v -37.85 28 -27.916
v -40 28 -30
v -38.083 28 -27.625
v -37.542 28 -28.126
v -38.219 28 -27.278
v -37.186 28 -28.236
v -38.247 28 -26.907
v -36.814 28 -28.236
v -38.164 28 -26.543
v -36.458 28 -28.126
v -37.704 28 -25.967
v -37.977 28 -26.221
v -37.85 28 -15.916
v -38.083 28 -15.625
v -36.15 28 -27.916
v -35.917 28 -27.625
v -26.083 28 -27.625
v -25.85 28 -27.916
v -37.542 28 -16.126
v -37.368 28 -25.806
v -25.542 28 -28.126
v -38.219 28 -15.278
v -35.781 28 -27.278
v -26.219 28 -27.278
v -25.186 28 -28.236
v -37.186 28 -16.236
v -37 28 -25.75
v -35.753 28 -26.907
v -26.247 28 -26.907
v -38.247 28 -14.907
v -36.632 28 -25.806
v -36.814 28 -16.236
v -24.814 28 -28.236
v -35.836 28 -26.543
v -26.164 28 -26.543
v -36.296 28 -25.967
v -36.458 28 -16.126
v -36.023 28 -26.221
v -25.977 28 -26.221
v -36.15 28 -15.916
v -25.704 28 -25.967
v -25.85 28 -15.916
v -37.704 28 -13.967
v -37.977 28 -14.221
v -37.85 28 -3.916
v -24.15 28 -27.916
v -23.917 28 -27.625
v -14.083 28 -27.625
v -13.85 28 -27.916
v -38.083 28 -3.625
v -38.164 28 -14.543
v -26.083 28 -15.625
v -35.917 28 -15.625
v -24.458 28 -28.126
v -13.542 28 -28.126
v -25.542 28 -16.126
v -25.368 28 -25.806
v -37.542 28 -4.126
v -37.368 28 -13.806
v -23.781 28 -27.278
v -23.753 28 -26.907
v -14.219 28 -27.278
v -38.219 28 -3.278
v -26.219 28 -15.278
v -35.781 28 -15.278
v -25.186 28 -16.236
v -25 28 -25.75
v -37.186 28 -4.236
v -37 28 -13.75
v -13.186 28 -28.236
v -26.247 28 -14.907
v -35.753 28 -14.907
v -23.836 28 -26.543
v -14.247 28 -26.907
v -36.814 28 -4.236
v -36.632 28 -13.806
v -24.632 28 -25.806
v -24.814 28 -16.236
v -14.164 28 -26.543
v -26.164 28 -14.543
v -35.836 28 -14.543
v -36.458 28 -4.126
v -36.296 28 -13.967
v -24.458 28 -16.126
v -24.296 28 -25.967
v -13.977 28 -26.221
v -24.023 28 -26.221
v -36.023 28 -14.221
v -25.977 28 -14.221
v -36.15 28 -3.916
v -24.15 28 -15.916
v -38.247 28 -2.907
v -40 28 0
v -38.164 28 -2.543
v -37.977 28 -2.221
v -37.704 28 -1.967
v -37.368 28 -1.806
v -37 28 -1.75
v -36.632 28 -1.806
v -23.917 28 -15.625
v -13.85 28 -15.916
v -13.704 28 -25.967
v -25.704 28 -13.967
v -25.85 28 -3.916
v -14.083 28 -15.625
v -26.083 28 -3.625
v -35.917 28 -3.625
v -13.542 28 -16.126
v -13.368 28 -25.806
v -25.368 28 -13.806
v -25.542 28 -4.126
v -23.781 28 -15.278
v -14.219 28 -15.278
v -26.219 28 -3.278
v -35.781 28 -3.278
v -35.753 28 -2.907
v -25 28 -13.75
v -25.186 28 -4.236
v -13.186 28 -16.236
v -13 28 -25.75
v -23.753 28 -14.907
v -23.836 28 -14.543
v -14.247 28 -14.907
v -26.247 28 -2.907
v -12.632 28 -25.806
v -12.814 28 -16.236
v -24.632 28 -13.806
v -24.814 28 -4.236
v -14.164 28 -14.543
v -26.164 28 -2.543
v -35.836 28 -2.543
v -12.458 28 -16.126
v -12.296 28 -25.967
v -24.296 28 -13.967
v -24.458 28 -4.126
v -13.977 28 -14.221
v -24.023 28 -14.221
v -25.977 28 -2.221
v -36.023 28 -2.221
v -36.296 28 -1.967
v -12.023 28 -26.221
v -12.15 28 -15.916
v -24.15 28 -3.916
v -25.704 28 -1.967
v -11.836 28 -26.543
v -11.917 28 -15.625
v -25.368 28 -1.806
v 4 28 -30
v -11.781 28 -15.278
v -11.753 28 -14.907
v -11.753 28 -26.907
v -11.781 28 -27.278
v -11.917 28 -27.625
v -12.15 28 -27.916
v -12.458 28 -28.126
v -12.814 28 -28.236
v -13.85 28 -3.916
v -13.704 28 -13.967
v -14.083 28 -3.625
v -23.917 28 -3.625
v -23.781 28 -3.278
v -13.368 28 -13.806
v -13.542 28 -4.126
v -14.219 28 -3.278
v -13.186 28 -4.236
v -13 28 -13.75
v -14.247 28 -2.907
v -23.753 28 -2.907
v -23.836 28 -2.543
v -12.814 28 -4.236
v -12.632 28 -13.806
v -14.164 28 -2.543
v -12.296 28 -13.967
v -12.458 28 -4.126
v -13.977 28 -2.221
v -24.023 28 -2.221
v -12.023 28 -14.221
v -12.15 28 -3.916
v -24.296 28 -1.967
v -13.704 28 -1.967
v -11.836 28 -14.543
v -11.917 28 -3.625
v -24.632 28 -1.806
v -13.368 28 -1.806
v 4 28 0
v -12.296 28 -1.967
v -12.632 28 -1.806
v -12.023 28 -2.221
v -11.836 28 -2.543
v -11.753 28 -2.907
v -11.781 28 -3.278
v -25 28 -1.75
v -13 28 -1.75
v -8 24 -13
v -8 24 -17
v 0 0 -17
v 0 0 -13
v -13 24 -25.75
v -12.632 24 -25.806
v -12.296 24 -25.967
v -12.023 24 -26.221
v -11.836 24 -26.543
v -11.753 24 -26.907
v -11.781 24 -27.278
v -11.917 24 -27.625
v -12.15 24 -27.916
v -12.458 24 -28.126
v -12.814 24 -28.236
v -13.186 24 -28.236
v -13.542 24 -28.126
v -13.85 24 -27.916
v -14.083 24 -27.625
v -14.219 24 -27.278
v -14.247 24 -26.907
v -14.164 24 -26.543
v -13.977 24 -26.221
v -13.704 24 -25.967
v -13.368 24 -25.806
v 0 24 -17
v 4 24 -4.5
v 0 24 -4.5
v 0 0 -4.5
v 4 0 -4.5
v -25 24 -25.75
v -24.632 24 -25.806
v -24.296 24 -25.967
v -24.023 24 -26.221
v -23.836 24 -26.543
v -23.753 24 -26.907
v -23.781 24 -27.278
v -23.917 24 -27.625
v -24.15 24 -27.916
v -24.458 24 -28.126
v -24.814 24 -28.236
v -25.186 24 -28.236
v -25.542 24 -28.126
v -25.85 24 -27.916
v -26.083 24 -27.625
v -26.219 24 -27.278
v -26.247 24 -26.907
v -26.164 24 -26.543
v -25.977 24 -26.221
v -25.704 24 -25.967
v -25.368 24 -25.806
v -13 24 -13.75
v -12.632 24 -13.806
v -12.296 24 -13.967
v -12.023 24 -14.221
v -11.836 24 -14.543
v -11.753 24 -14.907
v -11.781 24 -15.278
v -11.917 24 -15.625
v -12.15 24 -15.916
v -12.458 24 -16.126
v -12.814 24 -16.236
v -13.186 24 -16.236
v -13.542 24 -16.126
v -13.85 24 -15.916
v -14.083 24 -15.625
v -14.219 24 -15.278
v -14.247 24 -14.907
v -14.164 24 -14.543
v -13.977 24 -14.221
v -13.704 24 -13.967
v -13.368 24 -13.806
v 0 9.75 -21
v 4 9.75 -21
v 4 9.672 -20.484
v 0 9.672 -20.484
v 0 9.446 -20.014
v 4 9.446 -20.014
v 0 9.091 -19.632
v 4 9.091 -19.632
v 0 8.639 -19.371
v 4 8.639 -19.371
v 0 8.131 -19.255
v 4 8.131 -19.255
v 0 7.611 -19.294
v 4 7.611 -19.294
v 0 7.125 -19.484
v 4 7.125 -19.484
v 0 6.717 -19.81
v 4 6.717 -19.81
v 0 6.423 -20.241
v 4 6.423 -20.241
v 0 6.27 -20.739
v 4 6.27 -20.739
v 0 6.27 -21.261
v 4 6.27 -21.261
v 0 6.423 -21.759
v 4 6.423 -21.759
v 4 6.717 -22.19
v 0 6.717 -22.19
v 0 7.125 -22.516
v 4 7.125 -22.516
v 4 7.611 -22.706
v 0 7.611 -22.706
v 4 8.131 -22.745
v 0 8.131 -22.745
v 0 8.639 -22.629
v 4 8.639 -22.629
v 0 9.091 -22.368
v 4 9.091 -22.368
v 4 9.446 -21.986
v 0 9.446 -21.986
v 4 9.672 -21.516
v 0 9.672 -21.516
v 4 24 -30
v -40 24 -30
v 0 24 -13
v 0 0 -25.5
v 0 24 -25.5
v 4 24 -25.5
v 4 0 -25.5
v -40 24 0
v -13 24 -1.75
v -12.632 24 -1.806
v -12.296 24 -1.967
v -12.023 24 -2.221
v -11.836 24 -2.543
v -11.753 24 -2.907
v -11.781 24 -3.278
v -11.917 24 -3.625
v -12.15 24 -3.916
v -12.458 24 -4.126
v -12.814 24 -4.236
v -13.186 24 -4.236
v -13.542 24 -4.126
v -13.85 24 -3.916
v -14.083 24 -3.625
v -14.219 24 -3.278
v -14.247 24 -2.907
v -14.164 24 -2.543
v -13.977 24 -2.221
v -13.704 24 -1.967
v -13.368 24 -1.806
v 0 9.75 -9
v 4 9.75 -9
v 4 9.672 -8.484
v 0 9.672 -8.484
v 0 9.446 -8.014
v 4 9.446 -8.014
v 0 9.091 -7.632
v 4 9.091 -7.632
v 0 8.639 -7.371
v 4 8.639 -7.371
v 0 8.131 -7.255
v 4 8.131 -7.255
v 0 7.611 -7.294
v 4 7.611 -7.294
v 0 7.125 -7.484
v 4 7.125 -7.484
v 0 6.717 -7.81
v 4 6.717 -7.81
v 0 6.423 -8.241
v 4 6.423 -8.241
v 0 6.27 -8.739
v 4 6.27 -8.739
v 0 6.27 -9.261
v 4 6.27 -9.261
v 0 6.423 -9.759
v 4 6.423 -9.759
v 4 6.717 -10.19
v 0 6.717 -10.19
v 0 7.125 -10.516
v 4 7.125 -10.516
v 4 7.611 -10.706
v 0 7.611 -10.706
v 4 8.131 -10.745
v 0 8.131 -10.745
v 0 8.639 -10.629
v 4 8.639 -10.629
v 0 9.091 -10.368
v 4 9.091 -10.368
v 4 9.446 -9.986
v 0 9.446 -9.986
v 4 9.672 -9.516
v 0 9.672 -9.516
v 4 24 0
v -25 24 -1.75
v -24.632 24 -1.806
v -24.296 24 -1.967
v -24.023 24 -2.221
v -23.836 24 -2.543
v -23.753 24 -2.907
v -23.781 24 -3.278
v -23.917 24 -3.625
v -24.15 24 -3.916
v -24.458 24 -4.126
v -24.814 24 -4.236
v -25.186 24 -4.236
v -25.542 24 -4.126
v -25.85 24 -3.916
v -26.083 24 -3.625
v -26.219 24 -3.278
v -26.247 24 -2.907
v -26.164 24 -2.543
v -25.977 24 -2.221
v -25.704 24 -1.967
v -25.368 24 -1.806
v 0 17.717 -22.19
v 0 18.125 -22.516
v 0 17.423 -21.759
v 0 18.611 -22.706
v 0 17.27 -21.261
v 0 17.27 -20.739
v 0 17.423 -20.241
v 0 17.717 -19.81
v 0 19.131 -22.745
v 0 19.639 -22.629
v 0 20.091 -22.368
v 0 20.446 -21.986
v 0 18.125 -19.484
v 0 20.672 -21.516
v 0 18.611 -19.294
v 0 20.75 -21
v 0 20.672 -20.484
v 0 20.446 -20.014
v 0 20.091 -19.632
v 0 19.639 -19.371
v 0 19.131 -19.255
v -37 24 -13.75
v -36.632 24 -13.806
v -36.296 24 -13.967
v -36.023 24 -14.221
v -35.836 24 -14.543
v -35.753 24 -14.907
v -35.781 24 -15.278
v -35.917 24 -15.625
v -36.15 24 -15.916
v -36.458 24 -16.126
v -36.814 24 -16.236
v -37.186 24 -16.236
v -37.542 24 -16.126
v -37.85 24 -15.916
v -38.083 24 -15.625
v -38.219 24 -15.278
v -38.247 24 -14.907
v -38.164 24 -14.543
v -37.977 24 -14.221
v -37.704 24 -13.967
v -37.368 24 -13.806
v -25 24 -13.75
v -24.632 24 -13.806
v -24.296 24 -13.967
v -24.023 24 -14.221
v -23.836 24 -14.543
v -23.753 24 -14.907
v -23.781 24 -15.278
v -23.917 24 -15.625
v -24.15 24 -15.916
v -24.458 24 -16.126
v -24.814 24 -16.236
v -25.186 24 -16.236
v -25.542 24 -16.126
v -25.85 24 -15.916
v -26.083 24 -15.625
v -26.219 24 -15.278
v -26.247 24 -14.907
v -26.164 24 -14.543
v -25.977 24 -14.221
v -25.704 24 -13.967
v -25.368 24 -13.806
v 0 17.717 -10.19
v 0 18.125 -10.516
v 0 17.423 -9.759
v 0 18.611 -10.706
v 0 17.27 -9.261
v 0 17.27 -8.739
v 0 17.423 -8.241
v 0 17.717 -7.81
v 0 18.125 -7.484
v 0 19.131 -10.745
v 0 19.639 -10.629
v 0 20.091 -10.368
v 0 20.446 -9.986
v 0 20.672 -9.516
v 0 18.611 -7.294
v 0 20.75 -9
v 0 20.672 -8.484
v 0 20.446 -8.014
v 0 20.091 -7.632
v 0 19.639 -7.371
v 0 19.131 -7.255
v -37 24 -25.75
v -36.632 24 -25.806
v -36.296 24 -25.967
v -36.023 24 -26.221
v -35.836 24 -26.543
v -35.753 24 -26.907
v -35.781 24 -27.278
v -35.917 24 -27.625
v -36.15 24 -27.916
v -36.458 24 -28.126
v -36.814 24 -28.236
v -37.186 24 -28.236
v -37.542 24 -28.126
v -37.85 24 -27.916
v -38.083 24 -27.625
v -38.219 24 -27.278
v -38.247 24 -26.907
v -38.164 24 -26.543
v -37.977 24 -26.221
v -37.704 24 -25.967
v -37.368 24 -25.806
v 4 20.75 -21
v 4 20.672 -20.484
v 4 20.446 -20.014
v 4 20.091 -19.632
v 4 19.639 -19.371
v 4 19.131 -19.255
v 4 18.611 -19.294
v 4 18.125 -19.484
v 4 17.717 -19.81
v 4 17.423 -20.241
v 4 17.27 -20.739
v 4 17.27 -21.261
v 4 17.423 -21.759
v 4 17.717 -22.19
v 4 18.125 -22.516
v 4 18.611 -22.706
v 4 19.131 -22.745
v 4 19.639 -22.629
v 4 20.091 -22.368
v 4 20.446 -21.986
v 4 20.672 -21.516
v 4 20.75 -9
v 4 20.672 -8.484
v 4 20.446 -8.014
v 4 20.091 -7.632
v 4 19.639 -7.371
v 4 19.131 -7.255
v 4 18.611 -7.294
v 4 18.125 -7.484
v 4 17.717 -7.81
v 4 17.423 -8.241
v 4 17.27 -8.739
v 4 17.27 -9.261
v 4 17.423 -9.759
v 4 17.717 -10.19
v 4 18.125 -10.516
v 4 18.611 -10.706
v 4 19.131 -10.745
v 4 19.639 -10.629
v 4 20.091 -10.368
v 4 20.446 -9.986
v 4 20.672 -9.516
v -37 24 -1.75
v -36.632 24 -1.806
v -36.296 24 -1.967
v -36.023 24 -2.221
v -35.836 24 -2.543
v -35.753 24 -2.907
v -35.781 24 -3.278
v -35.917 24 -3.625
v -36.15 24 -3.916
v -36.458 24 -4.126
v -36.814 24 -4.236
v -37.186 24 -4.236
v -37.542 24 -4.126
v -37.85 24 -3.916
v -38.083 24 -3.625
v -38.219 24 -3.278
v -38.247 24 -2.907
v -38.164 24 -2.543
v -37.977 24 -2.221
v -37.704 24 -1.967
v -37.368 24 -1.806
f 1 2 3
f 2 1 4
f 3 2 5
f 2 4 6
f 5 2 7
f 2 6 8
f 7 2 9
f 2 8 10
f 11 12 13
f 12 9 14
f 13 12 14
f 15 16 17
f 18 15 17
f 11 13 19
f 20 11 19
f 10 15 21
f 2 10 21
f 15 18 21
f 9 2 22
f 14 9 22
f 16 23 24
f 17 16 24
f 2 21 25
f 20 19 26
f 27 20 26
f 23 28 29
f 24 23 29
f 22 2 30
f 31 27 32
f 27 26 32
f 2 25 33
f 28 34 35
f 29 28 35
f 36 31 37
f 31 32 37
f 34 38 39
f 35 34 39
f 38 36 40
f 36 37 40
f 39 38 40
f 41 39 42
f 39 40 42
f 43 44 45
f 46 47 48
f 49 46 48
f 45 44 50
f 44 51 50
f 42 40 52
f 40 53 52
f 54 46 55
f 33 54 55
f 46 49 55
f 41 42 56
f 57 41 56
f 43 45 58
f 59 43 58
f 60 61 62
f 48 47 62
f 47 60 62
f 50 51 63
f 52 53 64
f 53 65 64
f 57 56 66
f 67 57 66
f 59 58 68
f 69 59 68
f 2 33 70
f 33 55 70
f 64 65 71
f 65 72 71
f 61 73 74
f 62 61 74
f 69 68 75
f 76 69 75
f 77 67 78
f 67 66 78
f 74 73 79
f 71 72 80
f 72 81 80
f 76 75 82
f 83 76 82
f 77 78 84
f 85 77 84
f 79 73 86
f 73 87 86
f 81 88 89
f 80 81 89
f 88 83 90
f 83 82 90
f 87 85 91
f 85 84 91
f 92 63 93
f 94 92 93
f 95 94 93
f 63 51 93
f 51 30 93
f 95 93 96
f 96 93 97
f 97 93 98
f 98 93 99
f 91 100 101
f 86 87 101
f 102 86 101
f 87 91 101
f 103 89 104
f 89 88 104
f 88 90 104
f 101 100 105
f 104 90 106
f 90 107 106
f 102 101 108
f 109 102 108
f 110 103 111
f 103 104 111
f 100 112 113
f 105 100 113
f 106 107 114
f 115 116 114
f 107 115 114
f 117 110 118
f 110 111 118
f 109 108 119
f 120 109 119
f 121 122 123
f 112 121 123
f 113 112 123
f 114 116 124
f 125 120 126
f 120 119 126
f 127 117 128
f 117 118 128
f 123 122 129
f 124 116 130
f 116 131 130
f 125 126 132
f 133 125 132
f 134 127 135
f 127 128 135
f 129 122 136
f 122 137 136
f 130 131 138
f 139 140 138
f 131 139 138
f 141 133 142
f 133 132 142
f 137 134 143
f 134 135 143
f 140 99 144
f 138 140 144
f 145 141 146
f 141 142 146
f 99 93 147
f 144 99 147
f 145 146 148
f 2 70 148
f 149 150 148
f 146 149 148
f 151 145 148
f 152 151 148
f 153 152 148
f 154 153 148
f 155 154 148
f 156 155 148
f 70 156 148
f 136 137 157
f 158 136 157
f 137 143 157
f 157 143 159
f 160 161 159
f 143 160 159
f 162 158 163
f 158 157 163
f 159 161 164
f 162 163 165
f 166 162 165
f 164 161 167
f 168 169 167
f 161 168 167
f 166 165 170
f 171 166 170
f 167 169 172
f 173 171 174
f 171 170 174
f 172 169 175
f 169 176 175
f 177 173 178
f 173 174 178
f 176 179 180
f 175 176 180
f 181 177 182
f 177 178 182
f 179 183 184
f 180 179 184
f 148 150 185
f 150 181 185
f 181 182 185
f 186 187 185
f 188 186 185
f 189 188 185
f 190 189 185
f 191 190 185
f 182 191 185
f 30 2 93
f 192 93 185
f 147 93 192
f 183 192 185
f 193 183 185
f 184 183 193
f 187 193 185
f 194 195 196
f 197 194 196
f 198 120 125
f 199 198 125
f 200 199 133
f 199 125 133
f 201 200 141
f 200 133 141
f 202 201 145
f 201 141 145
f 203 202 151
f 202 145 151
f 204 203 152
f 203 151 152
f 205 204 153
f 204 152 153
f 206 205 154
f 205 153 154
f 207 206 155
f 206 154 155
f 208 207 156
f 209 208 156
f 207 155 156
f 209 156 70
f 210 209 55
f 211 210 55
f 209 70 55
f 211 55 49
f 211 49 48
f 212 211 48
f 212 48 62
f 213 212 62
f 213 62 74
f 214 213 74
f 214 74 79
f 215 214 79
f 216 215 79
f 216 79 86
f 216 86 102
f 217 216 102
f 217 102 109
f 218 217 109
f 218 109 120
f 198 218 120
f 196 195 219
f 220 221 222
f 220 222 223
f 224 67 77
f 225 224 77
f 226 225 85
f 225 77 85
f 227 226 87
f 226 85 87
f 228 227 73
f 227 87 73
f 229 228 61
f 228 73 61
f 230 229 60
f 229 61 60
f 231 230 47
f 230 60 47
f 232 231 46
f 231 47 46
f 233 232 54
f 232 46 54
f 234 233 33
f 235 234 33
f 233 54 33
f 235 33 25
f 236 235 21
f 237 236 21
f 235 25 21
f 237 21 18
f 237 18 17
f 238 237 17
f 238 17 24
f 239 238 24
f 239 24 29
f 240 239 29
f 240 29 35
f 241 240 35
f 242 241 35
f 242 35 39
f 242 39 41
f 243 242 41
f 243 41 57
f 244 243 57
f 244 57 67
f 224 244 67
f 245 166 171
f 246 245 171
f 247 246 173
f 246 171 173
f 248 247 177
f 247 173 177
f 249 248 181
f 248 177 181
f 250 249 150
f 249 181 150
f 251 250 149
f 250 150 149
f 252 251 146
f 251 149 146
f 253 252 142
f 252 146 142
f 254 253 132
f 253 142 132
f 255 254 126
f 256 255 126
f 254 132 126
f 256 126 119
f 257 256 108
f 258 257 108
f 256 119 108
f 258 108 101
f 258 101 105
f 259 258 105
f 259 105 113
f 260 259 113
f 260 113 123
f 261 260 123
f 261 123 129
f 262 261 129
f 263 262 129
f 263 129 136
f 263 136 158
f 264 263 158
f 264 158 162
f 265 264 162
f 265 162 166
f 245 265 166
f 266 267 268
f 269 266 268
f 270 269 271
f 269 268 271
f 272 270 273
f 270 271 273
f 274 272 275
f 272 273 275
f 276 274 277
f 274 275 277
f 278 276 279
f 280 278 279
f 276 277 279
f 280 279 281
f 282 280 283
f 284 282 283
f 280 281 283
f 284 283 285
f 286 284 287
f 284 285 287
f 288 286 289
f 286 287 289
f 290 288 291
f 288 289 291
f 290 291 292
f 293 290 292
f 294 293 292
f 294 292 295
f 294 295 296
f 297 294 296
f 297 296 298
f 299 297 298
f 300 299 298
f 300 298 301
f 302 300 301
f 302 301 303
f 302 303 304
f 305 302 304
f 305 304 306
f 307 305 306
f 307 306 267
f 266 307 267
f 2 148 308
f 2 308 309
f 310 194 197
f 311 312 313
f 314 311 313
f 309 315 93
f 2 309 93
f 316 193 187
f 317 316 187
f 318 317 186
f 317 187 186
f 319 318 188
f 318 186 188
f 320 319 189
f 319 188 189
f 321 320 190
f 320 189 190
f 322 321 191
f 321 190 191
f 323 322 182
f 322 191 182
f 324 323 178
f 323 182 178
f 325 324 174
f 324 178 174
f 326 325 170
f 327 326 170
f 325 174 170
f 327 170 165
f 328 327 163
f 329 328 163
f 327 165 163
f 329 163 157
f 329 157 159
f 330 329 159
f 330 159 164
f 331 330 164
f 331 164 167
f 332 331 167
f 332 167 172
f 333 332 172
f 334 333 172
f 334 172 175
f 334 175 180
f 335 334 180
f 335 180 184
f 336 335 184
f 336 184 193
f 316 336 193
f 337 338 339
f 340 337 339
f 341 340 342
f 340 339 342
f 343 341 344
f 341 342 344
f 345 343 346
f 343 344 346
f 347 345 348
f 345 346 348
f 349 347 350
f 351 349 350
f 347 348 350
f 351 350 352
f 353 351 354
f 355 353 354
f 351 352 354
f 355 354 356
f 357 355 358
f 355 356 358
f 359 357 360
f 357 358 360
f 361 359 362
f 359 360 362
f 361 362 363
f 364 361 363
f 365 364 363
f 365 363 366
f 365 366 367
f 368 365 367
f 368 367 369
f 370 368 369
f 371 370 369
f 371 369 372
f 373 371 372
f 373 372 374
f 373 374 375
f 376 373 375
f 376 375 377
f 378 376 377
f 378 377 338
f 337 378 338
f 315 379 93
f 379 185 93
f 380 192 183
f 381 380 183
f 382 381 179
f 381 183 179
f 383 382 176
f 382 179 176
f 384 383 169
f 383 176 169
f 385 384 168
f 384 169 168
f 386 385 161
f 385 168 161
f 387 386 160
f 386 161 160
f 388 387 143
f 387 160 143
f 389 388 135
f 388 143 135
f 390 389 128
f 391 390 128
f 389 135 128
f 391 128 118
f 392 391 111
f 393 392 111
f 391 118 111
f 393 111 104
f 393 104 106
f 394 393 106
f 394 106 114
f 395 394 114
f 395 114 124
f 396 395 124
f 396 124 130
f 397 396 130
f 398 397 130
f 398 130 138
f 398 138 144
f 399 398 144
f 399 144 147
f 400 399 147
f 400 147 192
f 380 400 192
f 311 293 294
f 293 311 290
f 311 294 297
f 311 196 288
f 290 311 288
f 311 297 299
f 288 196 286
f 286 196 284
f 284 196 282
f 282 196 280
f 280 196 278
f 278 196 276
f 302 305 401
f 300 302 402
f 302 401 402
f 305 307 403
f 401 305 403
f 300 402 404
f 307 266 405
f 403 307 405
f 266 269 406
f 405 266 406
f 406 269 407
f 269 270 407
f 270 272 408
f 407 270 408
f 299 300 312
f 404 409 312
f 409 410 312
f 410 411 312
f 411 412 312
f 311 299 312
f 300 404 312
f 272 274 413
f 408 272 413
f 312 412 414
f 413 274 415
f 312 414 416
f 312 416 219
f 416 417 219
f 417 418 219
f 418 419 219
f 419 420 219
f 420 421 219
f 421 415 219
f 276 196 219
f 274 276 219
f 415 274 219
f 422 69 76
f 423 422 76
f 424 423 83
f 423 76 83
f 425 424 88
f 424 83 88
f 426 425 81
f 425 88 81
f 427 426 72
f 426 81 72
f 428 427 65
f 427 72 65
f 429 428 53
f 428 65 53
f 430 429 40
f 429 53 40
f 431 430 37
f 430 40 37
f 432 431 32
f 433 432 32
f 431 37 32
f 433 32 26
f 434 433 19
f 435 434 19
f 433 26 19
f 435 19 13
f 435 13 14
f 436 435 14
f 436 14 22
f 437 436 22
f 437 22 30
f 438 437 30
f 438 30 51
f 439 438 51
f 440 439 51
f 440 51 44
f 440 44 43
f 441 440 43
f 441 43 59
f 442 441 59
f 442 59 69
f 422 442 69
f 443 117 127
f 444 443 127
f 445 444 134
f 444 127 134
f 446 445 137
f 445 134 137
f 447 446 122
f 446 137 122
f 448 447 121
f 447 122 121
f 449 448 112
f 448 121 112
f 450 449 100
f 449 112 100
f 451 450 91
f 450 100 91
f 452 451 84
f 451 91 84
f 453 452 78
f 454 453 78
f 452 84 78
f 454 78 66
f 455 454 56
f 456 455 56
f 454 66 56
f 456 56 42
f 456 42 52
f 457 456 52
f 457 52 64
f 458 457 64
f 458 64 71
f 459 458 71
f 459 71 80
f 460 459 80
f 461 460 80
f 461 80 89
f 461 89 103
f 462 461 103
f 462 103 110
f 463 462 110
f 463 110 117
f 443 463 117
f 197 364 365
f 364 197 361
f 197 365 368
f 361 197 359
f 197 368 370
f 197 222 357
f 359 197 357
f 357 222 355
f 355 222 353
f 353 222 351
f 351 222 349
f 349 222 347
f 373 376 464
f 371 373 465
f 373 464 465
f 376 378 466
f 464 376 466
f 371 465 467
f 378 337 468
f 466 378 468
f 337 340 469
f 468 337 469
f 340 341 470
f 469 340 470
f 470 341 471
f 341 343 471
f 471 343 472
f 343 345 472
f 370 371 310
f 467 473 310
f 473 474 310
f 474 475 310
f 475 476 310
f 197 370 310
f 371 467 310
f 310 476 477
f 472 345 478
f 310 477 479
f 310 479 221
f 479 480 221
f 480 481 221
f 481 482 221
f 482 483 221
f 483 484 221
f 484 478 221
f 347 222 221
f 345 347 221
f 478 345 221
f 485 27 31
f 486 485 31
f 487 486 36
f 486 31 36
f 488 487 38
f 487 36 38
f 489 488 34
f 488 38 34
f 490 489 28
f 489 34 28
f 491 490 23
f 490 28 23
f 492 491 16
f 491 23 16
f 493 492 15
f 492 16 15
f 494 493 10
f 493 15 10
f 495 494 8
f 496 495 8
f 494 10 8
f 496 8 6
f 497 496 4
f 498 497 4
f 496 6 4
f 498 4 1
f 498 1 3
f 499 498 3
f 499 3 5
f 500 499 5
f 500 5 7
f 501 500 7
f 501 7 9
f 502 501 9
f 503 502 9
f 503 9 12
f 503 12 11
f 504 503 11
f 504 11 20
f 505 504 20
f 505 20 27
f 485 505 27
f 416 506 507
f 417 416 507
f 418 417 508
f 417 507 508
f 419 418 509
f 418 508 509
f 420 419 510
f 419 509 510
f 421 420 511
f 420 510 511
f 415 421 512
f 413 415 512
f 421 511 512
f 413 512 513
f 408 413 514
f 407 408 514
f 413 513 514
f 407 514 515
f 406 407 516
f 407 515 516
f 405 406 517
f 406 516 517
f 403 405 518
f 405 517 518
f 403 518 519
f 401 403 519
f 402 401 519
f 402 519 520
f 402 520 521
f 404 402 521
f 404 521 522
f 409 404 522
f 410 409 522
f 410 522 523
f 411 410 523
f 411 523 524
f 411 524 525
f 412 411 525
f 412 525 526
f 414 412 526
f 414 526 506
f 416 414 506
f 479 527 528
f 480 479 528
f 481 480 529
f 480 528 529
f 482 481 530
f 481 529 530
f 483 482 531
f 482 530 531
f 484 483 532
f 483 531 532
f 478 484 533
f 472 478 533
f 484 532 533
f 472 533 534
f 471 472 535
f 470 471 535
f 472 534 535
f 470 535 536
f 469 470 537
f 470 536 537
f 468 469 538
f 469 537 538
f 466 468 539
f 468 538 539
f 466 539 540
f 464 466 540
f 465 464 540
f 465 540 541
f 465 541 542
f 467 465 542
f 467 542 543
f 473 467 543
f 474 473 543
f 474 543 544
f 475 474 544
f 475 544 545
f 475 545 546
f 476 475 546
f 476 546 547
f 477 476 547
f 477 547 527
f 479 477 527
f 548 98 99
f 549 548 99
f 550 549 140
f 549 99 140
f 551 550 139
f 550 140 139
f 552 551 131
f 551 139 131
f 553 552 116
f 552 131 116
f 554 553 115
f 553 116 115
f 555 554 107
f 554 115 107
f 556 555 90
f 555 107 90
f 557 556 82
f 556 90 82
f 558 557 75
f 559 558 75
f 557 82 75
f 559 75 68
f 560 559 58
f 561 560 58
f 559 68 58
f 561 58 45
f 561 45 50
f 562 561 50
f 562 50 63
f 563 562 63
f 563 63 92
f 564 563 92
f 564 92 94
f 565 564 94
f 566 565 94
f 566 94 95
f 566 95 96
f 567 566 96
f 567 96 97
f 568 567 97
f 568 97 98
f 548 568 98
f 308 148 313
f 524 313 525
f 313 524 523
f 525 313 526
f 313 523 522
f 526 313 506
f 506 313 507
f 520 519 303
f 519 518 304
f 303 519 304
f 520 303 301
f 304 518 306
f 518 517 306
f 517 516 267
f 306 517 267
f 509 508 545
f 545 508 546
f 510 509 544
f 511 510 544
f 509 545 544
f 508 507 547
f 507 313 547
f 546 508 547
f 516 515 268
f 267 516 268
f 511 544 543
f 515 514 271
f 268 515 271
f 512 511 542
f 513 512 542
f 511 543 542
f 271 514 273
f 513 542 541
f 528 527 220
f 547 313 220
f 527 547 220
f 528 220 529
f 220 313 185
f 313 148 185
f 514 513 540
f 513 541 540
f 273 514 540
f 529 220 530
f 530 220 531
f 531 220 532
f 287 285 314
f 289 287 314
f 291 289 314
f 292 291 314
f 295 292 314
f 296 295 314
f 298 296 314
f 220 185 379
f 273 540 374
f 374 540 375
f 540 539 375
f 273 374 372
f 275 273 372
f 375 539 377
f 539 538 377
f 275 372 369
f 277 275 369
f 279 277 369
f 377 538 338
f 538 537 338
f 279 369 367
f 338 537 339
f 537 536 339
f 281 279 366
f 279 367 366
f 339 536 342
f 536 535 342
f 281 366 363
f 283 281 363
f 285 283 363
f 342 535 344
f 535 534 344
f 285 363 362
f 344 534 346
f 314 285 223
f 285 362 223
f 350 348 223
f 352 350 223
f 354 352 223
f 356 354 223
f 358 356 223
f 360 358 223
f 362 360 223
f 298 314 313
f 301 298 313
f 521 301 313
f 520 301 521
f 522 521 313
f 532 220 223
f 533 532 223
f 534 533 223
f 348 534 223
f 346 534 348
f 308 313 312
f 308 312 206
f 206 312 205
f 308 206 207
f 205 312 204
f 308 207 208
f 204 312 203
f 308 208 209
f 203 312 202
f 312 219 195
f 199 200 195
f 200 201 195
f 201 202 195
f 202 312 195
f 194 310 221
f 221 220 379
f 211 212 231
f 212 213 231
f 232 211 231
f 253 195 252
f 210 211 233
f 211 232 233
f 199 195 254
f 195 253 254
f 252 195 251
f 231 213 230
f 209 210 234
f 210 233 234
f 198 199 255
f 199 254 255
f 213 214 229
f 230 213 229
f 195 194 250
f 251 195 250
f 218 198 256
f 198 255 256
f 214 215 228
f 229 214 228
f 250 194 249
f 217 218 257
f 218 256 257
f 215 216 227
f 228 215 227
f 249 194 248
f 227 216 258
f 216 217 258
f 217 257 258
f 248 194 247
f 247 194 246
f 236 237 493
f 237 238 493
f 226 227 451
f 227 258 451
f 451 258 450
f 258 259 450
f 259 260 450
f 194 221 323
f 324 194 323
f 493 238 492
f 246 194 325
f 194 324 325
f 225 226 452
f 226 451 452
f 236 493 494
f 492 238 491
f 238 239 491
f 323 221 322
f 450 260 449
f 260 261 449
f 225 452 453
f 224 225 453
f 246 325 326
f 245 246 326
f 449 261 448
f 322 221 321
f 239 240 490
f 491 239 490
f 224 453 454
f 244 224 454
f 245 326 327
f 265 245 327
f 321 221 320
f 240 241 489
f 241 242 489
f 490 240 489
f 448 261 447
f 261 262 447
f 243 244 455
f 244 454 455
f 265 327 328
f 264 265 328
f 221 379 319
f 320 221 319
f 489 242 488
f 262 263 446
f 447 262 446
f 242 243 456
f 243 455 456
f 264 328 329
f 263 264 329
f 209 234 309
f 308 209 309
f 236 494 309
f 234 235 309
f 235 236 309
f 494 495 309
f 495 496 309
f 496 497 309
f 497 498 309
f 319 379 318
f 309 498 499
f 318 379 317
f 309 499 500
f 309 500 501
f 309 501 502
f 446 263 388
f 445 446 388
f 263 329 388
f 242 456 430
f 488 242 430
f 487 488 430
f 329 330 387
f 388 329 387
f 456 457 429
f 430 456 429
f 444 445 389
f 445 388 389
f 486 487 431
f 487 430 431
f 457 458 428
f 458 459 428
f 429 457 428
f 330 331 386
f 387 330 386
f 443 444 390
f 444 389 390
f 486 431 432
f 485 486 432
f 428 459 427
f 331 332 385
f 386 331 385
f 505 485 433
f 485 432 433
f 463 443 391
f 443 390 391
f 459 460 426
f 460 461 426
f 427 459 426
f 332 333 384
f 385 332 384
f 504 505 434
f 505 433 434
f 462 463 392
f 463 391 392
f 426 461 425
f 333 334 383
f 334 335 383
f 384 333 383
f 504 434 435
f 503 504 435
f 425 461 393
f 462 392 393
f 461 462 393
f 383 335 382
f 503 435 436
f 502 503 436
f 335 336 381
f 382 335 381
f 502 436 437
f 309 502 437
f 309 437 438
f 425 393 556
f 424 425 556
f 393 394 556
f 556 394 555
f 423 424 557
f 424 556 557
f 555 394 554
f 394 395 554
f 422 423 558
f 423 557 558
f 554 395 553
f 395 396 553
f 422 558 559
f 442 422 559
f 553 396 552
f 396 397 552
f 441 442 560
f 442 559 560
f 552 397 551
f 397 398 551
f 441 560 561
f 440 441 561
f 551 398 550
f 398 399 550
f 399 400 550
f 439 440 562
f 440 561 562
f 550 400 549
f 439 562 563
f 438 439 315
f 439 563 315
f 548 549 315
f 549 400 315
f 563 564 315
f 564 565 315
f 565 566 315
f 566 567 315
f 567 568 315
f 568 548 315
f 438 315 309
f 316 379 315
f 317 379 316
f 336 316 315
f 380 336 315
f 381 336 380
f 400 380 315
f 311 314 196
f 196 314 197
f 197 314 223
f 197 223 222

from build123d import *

# Parameters (mm, degrees)
EXTRUDE_1_DEPTH      = 30
SKETCH_2_R           = 1.25
CUT_EXTRUDE_1_DEPTH  = 58.306195128
SKETCH_4_W           = 4
SKETCH_4_H           = 24
CUT_EXTRUDE_2_DEPTH  = 4.5
SKETCH_5_R           = 1.75
CUT_EXTRUDE_3_DEPTH  = 61.166435826
EXTRUDE_2_DEPTH      = 2
EXTRUDE_2_DEPTH_BACK = 2


with BuildPart() as part:
    # Эскиз1 → Бобышка-Вытянуть1 (new body)
    with BuildSketch(Plane.XY):
        Polygon((0, 0), (0, 24), (-40, 24), (-40, 28), (4, 28), (4, 0), align=None)
    extrude(amount=-EXTRUDE_1_DEPTH)

    # Эскиз2 → Вырез-Вытянуть1 (cut, through all)
    with BuildSketch(Plane(origin=(0, 28, 0), x_dir=(1, 0, 0), z_dir=(0, 1, 0))):
        with Locations(Location((-37, 3, 0), (0, 0, 270))):
            Circle(SKETCH_2_R)
        with Locations(Location((-13, 3, 0), (0, 0, 270))):
            Circle(SKETCH_2_R)
        with Locations(Location((-37, 27, 0), (0, 0, 270))):
            Circle(SKETCH_2_R)
        with Locations(Location((-37, 15, 0), (0, 0, 270))):
            Circle(SKETCH_2_R)
        with Locations(Location((-25, 27, 0), (0, 0, 270))):
            Circle(SKETCH_2_R)
        with Locations(Location((-13, 27, 0), (0, 0, 270))):
            Circle(SKETCH_2_R)
        with Locations(Location((-13, 15, 0), (0, 0, 270))):
            Circle(SKETCH_2_R)
        with Locations(Location((-25, 3, 0), (0, 0, 270))):
            Circle(SKETCH_2_R)
        with Locations(Location((-25, 15, 0), (0, 0, 270))):
            Circle(SKETCH_2_R)
    extrude(amount=-CUT_EXTRUDE_1_DEPTH, mode=Mode.SUBTRACT)

    # Эскиз4 → Вырез-Вытянуть2 (cut)
    with BuildSketch(Plane.XY):
        with Locations((2, 12)):
            Rectangle(SKETCH_4_W, SKETCH_4_H)
    cut_extrude_2 = extrude(amount=-CUT_EXTRUDE_2_DEPTH, mode=Mode.SUBTRACT)

    # Зеркальное отражение1: Вырез-Вытянуть2 across plane
    add(cut_extrude_2.mirror(Plane.XY.offset(-15)), mode=Mode.SUBTRACT)

    # Эскиз5 → Вырез-Вытянуть3 (cut, through all)
    with BuildSketch(Plane(origin=(4, 0, 0), x_dir=(0, 0, -1), z_dir=(1, 0, 0))):
        with Locations(Location((9, 19, 0), (0, 0, 90))):
            Circle(SKETCH_5_R)
        with Locations(Location((21, 19, 0), (0, 0, 90))):
            Circle(SKETCH_5_R)
        with Locations(Location((21, 8, 0), (0, 0, 90))):
            Circle(SKETCH_5_R)
        with Locations(Location((9, 8, 0), (0, 0, 90))):
            Circle(SKETCH_5_R)
    extrude(amount=-CUT_EXTRUDE_3_DEPTH, mode=Mode.SUBTRACT)

    # Эскиз8 → Бобышка-Вытянуть2 (add, two sides: drawn at the far end of the back side and taken through both)
    with BuildSketch(Plane.XY.offset(-15).offset(-EXTRUDE_2_DEPTH_BACK)):
        Polygon((0, 0), (0, 24), (-8, 24), align=None)
    extrude(amount=EXTRUDE_2_DEPTH + EXTRUDE_2_DEPTH_BACK)


solid = part.part
